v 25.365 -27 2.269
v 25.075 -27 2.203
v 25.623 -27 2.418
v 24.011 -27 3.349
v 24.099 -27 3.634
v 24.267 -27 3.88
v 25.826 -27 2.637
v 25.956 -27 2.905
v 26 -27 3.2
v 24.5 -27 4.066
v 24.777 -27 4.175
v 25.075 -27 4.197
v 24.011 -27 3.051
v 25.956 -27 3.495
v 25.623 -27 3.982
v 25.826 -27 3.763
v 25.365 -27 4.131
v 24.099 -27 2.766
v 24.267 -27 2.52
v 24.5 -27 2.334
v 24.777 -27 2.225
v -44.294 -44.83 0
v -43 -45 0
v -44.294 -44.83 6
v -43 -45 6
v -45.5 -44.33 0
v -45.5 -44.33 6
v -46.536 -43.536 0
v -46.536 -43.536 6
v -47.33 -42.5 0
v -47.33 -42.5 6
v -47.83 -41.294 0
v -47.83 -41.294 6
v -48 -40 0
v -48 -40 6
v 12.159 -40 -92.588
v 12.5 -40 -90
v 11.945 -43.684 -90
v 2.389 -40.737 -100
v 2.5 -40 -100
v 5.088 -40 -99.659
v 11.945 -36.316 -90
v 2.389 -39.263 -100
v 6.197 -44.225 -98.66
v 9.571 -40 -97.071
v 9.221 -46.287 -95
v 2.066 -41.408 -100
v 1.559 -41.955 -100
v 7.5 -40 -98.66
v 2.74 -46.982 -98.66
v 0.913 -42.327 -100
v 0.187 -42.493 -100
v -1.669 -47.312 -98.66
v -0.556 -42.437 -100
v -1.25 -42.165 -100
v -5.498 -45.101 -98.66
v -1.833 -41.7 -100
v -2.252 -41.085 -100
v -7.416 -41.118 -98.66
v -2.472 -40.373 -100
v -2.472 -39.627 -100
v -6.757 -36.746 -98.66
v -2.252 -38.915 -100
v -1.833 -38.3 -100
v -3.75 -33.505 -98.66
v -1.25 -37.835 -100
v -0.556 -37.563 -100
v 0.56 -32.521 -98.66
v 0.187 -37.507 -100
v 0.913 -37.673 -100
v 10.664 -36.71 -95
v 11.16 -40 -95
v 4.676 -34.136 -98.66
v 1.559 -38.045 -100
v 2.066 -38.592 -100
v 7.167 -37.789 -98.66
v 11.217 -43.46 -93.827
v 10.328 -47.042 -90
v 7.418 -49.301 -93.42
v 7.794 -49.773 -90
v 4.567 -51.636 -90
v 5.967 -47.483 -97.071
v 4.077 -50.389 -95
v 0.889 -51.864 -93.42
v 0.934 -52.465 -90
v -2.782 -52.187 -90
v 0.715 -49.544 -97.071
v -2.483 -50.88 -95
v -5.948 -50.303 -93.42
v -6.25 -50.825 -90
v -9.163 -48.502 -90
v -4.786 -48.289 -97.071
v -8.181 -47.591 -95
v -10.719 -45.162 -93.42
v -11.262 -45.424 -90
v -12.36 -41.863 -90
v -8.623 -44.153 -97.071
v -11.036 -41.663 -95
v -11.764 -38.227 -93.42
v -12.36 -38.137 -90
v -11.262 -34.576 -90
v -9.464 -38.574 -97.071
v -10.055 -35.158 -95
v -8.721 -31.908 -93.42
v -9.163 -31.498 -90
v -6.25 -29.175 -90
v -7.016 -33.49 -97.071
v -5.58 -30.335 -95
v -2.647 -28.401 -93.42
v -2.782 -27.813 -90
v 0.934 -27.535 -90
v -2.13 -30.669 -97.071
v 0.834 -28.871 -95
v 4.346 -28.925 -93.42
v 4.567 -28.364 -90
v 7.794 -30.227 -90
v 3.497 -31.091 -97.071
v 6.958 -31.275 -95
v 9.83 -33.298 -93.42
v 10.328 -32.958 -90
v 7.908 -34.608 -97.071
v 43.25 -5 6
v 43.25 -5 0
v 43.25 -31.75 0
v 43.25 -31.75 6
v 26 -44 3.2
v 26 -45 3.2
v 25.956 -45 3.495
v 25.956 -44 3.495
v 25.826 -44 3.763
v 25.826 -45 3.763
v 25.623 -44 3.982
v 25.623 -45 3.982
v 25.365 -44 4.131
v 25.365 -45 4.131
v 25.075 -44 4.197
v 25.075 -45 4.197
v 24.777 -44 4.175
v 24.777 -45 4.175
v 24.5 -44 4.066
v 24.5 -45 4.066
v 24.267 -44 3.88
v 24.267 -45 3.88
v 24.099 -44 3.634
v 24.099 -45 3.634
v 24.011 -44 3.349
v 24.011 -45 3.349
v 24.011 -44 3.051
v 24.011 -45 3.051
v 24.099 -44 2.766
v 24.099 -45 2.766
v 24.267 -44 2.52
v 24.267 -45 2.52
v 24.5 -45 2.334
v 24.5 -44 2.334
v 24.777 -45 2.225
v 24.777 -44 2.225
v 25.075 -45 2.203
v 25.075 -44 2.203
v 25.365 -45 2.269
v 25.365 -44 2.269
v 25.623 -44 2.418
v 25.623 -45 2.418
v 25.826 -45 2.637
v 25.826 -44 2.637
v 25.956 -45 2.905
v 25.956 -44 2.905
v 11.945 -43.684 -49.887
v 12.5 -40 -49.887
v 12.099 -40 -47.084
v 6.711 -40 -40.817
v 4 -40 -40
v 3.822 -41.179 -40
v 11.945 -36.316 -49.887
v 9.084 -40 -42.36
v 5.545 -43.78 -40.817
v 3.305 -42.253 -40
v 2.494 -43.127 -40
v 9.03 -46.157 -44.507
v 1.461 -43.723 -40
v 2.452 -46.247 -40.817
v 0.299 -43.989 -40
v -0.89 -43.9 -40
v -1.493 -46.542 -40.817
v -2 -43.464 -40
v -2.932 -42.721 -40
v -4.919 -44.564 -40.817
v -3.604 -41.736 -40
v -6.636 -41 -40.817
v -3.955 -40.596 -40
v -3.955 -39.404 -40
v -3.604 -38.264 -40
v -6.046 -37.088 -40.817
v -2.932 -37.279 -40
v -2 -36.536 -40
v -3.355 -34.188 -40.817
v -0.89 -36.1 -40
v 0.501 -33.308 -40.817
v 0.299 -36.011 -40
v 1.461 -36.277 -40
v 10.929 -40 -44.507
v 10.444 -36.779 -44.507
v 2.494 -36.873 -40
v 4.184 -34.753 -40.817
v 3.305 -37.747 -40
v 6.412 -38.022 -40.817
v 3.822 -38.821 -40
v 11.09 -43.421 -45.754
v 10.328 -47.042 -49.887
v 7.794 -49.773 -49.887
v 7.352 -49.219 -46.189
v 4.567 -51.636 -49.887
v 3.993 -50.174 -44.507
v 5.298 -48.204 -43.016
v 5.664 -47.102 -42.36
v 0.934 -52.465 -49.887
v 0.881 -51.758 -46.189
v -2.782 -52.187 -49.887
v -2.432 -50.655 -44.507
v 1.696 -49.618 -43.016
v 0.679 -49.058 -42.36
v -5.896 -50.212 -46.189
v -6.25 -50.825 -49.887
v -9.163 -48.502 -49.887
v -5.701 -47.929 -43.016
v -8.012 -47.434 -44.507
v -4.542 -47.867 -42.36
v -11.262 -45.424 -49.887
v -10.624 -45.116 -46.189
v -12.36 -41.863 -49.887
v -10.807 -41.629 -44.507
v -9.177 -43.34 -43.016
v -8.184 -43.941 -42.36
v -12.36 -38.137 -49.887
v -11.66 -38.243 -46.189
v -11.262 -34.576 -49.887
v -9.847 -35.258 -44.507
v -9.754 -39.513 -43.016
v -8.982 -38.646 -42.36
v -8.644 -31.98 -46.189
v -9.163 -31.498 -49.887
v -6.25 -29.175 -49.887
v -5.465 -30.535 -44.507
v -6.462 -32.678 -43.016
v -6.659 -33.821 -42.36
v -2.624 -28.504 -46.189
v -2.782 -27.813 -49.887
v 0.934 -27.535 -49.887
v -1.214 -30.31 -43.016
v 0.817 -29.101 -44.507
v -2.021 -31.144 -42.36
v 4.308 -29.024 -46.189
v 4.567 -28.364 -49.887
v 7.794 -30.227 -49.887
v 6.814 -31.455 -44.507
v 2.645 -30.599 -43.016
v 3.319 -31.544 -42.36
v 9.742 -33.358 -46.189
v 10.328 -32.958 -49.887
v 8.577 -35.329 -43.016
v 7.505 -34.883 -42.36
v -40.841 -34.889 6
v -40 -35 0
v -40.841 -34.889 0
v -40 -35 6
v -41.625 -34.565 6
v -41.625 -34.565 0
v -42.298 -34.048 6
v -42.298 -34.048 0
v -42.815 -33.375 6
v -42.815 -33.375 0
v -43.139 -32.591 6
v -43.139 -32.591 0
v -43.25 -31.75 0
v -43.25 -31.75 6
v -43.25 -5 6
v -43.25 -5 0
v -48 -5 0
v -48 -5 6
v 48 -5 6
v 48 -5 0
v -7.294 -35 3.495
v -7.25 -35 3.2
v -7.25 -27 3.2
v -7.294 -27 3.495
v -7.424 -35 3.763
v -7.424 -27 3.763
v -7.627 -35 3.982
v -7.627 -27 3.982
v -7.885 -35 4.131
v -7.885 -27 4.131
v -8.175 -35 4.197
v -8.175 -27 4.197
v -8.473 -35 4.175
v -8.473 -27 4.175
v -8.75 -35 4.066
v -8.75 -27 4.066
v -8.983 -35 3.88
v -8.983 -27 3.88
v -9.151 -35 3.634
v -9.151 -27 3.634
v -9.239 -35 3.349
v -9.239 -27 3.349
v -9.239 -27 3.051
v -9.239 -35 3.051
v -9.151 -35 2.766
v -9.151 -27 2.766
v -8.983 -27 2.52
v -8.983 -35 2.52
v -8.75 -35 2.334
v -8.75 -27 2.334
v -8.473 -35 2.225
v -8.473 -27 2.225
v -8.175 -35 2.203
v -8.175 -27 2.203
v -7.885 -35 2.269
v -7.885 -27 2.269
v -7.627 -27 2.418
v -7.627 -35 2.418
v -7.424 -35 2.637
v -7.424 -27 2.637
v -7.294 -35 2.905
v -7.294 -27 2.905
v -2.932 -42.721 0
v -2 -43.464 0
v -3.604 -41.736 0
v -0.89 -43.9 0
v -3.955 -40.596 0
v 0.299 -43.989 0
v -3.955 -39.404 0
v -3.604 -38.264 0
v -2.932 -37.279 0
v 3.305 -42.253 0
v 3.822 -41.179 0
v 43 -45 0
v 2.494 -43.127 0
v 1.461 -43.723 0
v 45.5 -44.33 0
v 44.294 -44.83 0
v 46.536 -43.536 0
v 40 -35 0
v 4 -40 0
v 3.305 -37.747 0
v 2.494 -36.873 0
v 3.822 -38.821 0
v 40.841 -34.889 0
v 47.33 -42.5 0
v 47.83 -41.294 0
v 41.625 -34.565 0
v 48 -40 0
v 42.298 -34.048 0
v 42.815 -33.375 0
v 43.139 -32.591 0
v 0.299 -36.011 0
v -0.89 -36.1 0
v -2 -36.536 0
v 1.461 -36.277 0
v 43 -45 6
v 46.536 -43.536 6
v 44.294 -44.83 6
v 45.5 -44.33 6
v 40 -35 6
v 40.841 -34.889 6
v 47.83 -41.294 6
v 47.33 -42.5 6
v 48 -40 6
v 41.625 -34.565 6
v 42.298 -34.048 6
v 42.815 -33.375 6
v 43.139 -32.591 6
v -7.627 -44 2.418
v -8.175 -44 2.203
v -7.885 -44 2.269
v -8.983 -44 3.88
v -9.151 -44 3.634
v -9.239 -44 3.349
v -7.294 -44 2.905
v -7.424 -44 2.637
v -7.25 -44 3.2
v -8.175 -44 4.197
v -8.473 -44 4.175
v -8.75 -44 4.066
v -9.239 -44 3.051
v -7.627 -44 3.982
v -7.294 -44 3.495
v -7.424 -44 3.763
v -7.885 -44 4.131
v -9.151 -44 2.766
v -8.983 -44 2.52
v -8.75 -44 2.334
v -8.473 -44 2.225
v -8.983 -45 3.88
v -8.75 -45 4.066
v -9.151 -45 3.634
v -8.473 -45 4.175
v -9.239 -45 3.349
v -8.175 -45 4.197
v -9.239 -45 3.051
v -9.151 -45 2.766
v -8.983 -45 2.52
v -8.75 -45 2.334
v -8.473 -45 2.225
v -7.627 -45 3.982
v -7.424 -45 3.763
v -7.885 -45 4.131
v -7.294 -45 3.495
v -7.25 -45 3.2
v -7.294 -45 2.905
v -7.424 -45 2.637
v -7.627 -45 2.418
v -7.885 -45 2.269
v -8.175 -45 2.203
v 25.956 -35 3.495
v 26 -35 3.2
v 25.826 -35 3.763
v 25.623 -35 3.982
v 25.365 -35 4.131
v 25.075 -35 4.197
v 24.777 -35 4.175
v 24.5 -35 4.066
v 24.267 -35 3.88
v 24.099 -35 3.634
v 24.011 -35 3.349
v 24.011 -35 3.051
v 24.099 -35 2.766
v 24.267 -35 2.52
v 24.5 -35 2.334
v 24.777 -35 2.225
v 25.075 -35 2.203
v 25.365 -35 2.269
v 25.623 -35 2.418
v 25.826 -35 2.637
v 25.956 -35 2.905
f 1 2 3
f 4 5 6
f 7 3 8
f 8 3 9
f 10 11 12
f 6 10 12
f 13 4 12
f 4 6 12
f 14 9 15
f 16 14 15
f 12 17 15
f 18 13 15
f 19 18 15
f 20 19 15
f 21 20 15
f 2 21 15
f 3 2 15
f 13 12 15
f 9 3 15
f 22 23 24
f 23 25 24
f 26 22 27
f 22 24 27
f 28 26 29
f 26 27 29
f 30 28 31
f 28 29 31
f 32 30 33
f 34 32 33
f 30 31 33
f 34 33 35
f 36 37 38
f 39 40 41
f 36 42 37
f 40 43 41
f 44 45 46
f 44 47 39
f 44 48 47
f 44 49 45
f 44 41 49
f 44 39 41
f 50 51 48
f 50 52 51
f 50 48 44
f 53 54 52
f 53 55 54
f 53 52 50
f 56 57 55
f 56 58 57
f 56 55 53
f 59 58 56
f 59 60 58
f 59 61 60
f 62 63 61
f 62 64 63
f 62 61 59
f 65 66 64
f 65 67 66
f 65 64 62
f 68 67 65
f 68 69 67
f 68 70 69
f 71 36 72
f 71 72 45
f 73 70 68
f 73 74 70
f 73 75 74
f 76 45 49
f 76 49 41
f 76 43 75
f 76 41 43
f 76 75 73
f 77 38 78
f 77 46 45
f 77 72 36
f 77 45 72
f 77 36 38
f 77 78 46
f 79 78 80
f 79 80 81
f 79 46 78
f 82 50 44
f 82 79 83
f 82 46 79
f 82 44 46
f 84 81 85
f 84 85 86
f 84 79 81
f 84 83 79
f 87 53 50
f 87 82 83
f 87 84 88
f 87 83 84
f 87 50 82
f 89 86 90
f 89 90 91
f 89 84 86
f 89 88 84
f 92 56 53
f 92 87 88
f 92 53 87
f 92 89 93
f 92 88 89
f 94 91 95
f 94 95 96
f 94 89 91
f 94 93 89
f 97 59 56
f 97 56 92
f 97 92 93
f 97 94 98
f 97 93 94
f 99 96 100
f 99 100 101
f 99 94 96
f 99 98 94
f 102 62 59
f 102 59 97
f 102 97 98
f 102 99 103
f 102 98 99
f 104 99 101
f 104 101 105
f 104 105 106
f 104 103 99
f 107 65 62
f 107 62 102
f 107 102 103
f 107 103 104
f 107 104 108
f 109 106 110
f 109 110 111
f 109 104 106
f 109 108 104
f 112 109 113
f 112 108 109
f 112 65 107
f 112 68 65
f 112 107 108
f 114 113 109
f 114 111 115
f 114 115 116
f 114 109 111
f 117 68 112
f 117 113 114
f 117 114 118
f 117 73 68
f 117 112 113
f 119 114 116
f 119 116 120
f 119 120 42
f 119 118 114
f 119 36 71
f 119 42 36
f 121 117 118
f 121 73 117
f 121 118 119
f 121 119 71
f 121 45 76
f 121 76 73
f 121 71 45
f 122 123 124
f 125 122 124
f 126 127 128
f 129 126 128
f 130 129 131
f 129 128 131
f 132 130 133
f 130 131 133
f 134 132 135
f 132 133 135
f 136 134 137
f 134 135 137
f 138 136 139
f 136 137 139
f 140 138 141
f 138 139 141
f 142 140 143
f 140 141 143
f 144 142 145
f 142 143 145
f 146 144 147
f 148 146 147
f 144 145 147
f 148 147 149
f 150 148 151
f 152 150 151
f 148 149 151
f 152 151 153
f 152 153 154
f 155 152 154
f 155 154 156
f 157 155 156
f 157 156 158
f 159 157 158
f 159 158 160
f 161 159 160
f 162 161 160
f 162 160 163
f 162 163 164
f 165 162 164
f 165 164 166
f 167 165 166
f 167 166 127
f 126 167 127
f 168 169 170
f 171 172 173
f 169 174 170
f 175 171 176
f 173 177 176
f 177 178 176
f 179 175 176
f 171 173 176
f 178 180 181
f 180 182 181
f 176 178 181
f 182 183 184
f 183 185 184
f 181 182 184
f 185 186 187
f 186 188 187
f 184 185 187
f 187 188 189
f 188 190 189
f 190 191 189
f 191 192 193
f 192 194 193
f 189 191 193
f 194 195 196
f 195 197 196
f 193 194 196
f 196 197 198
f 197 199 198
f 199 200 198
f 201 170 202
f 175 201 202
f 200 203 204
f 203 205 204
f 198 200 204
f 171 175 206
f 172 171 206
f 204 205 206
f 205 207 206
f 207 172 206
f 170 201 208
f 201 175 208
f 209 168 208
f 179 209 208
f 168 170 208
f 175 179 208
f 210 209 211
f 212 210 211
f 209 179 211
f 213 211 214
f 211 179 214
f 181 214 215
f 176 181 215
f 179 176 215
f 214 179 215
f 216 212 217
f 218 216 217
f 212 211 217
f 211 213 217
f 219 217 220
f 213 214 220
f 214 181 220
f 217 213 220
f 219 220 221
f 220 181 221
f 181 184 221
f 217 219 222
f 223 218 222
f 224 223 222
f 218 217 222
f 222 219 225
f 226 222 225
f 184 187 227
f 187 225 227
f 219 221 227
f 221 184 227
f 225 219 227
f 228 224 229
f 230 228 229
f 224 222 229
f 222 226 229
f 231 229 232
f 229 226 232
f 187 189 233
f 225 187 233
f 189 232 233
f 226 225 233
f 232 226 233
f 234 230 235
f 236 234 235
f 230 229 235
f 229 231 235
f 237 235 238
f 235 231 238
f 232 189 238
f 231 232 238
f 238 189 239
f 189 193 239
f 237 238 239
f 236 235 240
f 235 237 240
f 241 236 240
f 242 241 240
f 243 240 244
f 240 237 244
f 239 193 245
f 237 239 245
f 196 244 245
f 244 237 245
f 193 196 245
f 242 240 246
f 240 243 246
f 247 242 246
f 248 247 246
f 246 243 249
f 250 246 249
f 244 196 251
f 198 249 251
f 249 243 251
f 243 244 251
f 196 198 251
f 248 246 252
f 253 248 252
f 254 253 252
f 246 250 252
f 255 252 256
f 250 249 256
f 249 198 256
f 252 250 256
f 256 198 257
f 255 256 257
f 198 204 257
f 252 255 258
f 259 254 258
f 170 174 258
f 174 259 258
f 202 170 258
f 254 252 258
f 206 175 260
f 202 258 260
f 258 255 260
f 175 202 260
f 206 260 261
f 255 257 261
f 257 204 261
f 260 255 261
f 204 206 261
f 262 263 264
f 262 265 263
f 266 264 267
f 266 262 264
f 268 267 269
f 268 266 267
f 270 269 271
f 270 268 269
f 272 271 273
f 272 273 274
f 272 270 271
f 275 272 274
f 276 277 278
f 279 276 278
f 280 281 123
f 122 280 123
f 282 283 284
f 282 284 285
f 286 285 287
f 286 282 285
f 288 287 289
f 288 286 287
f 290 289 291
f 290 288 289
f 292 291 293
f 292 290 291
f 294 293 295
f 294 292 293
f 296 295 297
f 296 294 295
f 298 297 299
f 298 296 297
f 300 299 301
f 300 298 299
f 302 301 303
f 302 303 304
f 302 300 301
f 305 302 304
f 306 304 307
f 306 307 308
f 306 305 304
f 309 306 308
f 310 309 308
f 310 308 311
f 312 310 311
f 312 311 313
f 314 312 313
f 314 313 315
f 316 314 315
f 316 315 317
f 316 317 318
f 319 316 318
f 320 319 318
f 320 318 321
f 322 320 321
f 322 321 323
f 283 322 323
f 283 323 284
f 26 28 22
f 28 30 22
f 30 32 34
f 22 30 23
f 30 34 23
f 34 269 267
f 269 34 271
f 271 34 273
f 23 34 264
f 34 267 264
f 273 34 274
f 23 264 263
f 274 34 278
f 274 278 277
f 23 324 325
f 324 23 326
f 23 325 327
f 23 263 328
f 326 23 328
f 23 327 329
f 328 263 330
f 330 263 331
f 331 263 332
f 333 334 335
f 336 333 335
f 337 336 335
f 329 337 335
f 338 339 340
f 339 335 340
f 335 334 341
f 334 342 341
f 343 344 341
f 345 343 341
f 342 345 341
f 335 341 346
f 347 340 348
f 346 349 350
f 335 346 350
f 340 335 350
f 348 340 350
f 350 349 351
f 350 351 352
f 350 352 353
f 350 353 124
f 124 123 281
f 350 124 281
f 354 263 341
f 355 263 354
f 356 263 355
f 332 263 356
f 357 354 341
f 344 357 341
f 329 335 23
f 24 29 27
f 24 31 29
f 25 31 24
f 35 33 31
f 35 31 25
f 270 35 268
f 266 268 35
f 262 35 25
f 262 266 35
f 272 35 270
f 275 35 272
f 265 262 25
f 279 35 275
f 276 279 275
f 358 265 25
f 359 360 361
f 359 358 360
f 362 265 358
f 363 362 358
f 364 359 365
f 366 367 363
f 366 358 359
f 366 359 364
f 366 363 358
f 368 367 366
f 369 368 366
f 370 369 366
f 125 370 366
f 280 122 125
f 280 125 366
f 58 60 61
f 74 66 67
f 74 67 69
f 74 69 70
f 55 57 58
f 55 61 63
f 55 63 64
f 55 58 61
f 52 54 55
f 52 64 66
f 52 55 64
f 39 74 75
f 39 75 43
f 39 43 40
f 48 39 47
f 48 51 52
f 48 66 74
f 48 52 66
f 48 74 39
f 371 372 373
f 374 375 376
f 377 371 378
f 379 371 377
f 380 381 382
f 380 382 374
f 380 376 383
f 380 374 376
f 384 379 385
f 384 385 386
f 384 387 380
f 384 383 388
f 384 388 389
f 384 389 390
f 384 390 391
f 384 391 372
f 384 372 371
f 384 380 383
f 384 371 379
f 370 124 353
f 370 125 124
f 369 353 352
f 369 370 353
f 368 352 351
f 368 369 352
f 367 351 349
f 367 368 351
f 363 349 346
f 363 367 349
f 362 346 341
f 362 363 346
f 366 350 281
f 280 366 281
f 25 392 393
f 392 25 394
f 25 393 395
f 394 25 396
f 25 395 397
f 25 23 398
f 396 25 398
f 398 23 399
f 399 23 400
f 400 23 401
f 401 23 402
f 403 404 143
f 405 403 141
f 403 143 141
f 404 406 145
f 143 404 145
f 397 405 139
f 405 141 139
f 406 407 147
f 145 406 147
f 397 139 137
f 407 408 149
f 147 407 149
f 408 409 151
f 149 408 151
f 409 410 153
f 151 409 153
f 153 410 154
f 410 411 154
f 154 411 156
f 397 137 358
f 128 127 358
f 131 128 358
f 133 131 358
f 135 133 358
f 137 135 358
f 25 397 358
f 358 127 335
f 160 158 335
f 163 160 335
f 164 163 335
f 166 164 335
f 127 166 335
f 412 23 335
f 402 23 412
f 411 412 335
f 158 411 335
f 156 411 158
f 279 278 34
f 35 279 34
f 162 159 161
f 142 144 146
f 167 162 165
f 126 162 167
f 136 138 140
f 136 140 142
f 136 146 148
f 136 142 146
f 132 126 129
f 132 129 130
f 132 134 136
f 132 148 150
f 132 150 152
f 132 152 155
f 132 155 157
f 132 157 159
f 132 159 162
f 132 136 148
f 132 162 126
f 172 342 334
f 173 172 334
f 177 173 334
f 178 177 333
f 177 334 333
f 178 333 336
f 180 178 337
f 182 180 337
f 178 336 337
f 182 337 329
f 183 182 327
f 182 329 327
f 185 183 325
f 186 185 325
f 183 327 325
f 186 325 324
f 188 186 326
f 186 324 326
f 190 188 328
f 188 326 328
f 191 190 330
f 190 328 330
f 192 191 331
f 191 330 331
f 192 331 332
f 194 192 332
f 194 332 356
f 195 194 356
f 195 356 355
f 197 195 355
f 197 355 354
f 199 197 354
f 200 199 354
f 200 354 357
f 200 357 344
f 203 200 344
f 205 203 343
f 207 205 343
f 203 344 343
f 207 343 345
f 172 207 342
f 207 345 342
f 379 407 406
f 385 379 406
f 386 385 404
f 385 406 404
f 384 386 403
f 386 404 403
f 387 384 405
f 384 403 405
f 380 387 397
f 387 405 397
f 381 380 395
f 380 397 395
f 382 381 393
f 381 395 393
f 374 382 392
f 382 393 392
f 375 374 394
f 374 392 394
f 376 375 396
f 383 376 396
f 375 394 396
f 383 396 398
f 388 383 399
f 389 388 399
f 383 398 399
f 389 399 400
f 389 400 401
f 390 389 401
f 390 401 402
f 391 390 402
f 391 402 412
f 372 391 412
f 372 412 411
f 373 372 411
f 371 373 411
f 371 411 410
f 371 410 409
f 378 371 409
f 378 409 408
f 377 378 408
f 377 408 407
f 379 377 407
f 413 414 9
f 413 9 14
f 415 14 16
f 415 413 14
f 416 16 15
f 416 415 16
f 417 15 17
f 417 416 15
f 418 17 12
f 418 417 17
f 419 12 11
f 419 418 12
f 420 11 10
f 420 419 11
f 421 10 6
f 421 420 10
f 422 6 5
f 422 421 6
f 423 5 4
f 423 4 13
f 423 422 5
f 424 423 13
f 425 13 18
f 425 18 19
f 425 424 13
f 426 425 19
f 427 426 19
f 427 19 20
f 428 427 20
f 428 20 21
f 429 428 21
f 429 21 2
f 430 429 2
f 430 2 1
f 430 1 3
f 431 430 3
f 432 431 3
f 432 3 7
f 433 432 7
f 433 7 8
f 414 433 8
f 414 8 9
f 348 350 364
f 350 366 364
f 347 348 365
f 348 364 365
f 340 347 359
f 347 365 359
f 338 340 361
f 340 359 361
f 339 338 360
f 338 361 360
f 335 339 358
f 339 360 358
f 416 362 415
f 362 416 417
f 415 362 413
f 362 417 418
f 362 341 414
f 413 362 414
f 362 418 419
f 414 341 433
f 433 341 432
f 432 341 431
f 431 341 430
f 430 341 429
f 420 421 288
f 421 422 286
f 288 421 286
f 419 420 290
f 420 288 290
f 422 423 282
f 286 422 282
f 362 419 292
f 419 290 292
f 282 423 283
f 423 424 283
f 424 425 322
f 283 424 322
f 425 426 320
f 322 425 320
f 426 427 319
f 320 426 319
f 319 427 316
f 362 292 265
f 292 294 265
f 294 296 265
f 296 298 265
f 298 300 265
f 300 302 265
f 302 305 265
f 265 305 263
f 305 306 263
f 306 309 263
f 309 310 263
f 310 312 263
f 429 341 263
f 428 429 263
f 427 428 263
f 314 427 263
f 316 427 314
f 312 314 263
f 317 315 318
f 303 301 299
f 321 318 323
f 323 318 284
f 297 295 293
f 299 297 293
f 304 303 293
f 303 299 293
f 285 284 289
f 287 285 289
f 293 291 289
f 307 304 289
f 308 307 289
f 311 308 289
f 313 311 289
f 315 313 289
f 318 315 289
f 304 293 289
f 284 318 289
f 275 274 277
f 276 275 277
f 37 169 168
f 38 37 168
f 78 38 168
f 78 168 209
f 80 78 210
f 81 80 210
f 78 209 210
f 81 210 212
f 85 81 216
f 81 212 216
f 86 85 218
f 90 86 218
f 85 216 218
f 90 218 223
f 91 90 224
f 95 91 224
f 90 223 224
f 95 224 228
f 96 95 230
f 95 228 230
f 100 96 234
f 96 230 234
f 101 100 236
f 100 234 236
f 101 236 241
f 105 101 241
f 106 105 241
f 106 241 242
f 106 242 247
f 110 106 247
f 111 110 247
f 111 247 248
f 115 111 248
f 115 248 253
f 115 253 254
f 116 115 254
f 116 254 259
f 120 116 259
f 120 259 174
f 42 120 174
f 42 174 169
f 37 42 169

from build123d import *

# Parameters (mm, degrees)
F1_DEPTH  = 6
F2_R      = 3.25
F3_R      = 5
F4_R      = 1
F5_DEPTH  = 10
F6_R      = 4
F7_DEPTH  = 40
F8_R      = 12.5
F8_R_2    = 4
F9_DEPTH  = 60
F12_R     = 1
F13_DEPTH = 17


# Not quite as in the source:
# - a fillet or chamfer that OpenCascade refuses, or shapes differently, is made with other operations: its cross-section is extruded or revolved along the edge and cut away or added


with BuildPart() as f1:
    # F0 (on Top) → F1 (new body)
    with BuildSketch(Plane.XY):
        Polygon((-48, -5), (-48, -45), (48, -45), (48, -5), (43.25, -5), (43.25, -35), (-43.25, -35), (-43.25, -5), align=None)
    extrude(amount=F1_DEPTH)

    # F2
    f2_edges = [f1.edges().sort_by_distance(p)[0] for p in [
        (-43.25, -35, 3),
        (43.25, -35, 3),
    ]]
    fillet(f2_edges, radius=F2_R)

    # F3
    f3_edges = [f1.edges().sort_by_distance(p)[0] for p in [
        (48, -45, 3),
        (-48, -45, 3),
    ]]
    fillet(f3_edges, radius=F3_R)

    # F4 (on face) → F5 (cut)
    with BuildSketch(Plane.XZ.offset(45)):
        with Locations((-8.25, 3.2)):
            Circle(F4_R)
        with Locations((25, 3.2)):
            Circle(F4_R)
    extrude(amount=-F5_DEPTH, mode=Mode.SUBTRACT)

    # F6 (on face) → F7 (join)
    with BuildSketch(Plane(origin=(0, 0, 0), x_dir=(1, 0, 0), z_dir=(0, 0, -1))):
        with Locations((0, 40)):
            Circle(F6_R)
    extrude(amount=F7_DEPTH)

    # F8 (on face) → F9 (join)
    with BuildSketch(Plane(origin=(0, 0, -40), x_dir=(1, 0, 0), z_dir=(0, 0, -1))):
        with Locations((0, 40)):
            Circle(F8_R)
        with Locations((0, 40)):
            Circle(F8_R_2, mode=Mode.SUBTRACT)
        with Locations((0, 40)):
            Circle(F8_R_2)
    extrude(amount=F9_DEPTH)

    # F10: fillet of radius 10 on 2 edges, made by hand

    # F10_s1 → F10_t2 (revolve, cut)
    with BuildSketch(Plane.XZ.offset(40)):
        with BuildLine():
            ThreePointArc((12.5, -90), (9.5710678119, -97.0710678119), (2.5, -100))
            Line((2.5, -100), (12.5, -100))
            Line((12.5, -100), (12.5, -90))
        make_face()
    revolve(axis=Axis((0, -40, -100), (0, 0, -1)), mode=Mode.SUBTRACT)

    # F10_s3 → F10_t4 (revolve, cut)
    with BuildSketch(Plane.XZ.offset(40)):
        with BuildLine():
            ThreePointArc((12.5, -49.8868599666), (10.0828754441, -43.3676575614), (4, -40))
            Line((4, -40), (12.5, -40))
            Line((12.5, -40), (12.5, -49.8868599666))
        make_face()
    revolve(axis=Axis((0, -40, -40), (0, 0, -1)), mode=Mode.SUBTRACT)

    # F12 (on offset) → F13 (join)
    with BuildSketch(Plane.XZ.offset(44)):
        with Locations((-8.25, 3.2)):
            Circle(F12_R)
        with Locations((25, 3.2)):
            Circle(F12_R)
    extrude(amount=-F13_DEPTH)


solid = f1.part
